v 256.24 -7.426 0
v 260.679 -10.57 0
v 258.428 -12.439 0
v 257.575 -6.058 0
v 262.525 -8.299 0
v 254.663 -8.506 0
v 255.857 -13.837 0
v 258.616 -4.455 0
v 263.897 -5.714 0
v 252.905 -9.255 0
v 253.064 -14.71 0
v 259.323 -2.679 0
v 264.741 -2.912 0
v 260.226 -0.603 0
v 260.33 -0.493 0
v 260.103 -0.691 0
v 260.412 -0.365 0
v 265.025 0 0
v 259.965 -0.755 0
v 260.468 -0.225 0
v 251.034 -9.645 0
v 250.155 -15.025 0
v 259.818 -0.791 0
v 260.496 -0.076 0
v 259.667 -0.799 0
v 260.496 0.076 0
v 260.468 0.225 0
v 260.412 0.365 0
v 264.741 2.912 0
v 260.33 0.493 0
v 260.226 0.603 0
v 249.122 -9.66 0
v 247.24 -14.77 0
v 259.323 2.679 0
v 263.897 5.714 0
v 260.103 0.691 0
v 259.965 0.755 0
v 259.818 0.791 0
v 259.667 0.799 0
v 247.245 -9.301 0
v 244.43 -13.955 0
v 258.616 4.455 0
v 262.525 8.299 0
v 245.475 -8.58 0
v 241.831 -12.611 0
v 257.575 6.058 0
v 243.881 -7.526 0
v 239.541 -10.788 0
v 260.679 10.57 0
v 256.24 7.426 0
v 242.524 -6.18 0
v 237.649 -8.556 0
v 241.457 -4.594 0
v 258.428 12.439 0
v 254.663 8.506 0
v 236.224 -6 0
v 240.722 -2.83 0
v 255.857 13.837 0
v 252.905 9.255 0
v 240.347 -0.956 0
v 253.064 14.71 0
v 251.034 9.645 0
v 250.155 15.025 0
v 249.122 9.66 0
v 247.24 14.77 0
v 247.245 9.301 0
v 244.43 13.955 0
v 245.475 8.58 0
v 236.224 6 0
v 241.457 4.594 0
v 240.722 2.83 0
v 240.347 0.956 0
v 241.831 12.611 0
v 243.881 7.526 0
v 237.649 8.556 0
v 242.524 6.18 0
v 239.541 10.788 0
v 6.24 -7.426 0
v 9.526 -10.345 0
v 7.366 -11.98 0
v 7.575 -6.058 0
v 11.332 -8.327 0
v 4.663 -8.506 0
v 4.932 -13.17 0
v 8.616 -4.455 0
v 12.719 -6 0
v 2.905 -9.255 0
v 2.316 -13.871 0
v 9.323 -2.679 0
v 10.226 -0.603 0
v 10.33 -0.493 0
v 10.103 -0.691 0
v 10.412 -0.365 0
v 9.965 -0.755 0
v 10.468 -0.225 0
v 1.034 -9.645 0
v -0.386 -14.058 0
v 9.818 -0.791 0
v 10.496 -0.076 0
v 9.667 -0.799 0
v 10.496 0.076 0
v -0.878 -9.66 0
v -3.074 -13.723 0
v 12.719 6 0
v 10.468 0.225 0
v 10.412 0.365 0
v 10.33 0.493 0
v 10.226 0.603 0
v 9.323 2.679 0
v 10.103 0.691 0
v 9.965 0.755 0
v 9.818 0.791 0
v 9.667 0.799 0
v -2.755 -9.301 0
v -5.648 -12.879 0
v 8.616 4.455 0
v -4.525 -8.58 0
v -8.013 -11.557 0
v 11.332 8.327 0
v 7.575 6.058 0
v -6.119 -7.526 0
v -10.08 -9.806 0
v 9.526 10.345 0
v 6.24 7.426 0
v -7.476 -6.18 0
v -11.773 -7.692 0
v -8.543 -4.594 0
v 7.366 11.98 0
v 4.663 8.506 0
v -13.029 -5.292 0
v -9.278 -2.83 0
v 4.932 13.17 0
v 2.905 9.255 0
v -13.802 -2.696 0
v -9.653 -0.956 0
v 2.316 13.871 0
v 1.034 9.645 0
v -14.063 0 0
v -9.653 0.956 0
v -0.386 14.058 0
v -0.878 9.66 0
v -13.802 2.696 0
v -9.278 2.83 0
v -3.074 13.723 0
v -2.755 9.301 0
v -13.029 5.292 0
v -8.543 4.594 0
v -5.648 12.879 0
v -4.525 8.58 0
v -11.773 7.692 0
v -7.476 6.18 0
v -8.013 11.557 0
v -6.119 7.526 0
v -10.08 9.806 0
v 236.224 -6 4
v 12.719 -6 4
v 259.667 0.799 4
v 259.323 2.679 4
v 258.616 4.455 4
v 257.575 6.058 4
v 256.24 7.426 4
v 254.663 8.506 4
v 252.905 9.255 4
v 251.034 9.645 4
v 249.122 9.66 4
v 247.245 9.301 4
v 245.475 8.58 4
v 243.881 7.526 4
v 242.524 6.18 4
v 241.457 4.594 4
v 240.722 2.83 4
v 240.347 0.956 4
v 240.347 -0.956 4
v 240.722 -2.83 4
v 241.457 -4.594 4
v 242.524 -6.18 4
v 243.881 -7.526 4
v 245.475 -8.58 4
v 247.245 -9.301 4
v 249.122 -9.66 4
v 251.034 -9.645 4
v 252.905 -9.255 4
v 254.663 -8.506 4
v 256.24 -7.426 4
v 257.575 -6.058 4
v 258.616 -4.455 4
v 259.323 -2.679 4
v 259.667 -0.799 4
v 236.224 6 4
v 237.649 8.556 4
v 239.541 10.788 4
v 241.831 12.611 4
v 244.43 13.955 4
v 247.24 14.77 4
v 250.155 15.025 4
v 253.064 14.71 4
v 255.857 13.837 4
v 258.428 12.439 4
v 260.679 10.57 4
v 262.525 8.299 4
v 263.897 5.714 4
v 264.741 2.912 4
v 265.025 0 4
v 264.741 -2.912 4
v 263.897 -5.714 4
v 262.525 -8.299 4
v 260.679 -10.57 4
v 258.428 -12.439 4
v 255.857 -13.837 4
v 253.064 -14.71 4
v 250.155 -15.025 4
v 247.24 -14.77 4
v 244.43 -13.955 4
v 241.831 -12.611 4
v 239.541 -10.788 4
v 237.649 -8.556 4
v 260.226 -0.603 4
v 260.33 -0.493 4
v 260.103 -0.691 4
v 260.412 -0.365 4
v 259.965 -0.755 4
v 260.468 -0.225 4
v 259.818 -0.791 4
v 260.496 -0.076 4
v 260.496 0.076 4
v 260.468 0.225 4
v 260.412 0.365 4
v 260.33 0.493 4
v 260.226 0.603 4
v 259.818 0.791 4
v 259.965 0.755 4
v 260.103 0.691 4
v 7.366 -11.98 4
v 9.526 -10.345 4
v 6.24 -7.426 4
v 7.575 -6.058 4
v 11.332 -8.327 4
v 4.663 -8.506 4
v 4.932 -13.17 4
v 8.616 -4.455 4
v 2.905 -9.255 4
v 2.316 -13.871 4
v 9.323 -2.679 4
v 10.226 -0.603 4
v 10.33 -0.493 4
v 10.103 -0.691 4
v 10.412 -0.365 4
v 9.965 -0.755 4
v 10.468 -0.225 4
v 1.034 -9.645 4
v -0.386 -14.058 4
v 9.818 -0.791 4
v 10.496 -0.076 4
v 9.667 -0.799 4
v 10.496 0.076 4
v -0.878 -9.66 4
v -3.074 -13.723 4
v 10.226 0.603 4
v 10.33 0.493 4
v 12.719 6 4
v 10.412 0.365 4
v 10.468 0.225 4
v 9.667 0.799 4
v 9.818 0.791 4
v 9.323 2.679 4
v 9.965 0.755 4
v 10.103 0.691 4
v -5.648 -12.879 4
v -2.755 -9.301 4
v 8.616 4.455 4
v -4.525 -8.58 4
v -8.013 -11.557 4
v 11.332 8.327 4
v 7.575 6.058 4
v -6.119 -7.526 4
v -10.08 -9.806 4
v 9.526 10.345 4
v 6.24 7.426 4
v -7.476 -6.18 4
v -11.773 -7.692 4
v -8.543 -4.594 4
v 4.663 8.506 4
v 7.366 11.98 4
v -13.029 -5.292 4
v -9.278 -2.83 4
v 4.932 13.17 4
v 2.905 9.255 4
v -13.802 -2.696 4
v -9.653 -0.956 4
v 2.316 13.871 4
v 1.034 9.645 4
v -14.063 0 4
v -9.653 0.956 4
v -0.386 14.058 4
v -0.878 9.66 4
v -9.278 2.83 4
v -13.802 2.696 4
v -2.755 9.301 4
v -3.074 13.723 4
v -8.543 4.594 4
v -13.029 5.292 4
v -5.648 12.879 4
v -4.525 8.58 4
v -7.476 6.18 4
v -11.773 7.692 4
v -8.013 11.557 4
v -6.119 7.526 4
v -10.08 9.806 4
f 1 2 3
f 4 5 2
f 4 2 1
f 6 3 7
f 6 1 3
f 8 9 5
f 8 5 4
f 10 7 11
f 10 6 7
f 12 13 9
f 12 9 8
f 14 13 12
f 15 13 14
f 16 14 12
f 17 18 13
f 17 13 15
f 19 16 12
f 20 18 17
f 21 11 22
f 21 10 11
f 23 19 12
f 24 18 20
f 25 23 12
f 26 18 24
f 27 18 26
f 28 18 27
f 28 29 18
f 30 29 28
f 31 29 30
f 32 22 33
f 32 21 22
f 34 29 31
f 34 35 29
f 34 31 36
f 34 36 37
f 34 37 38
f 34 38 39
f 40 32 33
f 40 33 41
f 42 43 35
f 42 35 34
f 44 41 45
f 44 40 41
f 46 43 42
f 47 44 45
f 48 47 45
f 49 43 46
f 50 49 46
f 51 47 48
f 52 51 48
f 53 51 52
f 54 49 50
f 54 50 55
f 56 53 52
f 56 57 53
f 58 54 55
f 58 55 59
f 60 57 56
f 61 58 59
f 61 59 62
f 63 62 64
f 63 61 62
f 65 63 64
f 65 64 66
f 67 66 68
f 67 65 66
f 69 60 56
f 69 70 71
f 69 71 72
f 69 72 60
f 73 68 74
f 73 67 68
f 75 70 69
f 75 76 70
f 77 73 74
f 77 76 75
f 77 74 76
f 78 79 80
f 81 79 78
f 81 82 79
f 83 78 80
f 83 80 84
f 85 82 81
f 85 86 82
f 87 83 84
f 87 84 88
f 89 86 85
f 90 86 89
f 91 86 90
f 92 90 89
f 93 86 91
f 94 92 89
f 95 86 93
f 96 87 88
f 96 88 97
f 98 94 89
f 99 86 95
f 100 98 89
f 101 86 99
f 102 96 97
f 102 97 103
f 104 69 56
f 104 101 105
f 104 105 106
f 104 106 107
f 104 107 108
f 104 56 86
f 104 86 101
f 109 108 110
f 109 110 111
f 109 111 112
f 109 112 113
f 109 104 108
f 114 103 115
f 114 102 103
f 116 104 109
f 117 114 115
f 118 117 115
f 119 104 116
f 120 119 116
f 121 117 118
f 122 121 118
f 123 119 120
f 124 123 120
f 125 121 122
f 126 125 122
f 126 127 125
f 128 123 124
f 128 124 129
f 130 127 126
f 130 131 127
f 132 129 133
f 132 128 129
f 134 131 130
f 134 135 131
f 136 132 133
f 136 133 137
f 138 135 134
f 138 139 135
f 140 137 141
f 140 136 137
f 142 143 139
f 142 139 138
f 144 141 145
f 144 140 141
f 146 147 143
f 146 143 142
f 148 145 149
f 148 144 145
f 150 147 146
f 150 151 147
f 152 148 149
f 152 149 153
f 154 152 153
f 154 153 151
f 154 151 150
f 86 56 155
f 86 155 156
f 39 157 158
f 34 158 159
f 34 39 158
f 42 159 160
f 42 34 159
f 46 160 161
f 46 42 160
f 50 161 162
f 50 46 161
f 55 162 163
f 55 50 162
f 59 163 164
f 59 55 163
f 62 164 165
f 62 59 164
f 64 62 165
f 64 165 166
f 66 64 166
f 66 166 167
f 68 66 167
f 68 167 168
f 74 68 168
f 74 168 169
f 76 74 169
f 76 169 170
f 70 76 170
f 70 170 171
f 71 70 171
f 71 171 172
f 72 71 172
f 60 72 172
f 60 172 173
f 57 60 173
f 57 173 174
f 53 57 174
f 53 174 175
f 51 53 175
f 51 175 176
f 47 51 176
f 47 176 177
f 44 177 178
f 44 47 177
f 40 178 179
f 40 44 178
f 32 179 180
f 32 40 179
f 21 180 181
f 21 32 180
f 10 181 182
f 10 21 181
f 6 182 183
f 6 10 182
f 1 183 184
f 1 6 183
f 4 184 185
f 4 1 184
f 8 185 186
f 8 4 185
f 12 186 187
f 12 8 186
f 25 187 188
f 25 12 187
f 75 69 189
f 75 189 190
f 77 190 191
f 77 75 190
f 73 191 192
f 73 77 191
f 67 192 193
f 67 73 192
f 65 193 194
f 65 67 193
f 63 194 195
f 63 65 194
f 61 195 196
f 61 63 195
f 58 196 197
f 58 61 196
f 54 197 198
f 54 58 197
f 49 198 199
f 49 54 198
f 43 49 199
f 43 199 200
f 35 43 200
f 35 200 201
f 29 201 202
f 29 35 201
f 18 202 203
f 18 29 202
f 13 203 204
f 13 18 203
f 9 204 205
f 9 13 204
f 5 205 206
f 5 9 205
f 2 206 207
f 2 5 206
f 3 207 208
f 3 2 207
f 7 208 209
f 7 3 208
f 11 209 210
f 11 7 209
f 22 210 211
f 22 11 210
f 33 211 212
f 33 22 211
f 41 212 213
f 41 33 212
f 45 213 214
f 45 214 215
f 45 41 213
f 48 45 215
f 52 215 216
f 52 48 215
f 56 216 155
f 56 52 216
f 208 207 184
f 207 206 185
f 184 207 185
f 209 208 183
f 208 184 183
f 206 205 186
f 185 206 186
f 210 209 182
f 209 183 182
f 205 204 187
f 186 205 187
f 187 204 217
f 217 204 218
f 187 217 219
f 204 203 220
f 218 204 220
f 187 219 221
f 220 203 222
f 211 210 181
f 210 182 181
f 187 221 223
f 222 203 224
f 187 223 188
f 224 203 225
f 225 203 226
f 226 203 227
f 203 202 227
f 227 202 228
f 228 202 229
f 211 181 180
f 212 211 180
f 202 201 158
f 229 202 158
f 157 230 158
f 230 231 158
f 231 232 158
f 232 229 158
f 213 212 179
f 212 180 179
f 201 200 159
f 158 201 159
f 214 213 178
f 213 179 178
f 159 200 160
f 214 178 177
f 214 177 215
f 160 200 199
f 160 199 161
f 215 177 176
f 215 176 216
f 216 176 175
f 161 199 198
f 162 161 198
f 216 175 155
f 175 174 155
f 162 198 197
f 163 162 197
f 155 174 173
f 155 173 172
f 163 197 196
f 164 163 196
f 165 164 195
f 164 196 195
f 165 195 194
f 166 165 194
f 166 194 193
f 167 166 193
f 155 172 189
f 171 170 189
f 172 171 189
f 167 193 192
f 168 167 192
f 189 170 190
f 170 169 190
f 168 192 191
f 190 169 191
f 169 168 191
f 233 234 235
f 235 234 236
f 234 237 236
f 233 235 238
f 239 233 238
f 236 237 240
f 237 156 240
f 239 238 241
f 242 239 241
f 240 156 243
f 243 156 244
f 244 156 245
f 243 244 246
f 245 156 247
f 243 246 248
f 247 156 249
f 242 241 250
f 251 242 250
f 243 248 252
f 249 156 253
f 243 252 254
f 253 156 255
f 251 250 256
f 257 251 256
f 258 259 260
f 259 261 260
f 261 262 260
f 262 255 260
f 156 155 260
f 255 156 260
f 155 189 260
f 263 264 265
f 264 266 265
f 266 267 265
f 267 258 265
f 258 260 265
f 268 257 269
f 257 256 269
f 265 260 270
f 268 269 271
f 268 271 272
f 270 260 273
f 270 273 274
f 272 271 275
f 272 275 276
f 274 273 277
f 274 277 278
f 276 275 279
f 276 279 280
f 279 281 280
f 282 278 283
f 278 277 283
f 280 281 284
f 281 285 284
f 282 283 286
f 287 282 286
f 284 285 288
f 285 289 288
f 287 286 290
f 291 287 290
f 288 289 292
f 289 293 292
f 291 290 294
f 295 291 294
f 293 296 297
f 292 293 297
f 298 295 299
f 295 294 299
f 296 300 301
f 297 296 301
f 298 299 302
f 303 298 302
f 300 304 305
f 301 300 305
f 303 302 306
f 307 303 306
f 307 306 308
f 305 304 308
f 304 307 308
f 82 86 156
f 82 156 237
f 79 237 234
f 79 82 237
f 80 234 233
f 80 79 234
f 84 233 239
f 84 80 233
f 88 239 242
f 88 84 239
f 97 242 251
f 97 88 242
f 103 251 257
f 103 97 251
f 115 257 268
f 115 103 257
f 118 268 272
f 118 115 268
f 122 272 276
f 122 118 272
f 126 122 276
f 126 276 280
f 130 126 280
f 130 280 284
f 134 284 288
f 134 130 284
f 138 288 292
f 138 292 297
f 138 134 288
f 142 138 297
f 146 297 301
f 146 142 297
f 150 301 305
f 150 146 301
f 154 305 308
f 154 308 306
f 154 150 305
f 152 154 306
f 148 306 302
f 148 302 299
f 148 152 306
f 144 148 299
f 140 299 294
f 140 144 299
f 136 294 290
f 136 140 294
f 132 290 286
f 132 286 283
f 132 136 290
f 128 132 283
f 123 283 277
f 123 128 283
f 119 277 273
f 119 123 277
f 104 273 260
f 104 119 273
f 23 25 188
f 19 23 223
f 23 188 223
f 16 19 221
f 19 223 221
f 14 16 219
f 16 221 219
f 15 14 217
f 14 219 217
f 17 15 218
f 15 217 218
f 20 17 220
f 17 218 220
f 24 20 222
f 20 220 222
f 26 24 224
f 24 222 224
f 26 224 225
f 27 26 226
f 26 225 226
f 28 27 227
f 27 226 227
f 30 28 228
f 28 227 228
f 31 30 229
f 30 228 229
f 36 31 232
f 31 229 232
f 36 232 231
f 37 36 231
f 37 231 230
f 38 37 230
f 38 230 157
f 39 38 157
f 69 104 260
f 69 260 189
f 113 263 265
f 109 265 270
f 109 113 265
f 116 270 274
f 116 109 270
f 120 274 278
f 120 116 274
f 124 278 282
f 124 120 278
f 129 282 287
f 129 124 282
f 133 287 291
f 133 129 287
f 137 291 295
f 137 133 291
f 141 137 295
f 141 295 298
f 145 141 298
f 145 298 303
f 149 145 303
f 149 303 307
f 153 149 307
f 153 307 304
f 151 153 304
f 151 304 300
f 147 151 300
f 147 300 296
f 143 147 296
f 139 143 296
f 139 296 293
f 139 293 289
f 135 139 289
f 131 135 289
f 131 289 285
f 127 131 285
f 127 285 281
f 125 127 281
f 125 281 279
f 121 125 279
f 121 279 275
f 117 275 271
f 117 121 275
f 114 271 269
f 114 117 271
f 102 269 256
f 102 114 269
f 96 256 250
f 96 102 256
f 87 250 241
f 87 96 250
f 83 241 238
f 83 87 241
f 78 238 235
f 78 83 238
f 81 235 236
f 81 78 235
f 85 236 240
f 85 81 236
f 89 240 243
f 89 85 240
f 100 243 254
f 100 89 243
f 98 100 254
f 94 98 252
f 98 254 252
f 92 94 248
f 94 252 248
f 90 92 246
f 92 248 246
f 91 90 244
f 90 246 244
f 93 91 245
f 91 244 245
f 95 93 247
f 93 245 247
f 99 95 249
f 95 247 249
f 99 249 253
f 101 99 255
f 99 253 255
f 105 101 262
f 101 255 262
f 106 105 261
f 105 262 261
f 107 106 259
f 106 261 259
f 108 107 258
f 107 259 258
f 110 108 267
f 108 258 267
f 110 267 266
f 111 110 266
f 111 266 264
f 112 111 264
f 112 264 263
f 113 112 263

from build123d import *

# Parameters (mm, degrees)
SKETCH_1_R          = 9.7
EXTRUDE_1_DEPTH     = 4
SKETCH_3_R          = 0.8
CUT_EXTRUDE_1_DEPTH = 10


with BuildPart() as part:
    # 草图1 → 凸台-拉伸1 (new body)
    with BuildSketch(Plane.XY):
        with BuildLine():
            Line((12.718684308, 6), (236.224480753, 6))
            ThreePointArc((236.224480753, 6), (265.02547605, 0), (236.224480753, -6))
            Line((236.224480753, -6), (12.718684308, -6))
            ThreePointArc((12.718684308, -6), (-14.062891969, 0), (12.718684308, 6))
        make_face()
        Circle(SKETCH_1_R, mode=Mode.SUBTRACT)
        with Locations((250, 0)):
            Circle(SKETCH_1_R, mode=Mode.SUBTRACT)
    extrude(amount=EXTRUDE_1_DEPTH)

    # 草图3 → 切除-拉伸1 (cut)
    with BuildSketch(Plane.XY.offset(4)):
        with Locations((9.7, 0)):
            Circle(SKETCH_3_R)
        with Locations((259.7, 0)):
            Circle(SKETCH_3_R)
    extrude(amount=-CUT_EXTRUDE_1_DEPTH, mode=Mode.SUBTRACT)


solid = part.part
